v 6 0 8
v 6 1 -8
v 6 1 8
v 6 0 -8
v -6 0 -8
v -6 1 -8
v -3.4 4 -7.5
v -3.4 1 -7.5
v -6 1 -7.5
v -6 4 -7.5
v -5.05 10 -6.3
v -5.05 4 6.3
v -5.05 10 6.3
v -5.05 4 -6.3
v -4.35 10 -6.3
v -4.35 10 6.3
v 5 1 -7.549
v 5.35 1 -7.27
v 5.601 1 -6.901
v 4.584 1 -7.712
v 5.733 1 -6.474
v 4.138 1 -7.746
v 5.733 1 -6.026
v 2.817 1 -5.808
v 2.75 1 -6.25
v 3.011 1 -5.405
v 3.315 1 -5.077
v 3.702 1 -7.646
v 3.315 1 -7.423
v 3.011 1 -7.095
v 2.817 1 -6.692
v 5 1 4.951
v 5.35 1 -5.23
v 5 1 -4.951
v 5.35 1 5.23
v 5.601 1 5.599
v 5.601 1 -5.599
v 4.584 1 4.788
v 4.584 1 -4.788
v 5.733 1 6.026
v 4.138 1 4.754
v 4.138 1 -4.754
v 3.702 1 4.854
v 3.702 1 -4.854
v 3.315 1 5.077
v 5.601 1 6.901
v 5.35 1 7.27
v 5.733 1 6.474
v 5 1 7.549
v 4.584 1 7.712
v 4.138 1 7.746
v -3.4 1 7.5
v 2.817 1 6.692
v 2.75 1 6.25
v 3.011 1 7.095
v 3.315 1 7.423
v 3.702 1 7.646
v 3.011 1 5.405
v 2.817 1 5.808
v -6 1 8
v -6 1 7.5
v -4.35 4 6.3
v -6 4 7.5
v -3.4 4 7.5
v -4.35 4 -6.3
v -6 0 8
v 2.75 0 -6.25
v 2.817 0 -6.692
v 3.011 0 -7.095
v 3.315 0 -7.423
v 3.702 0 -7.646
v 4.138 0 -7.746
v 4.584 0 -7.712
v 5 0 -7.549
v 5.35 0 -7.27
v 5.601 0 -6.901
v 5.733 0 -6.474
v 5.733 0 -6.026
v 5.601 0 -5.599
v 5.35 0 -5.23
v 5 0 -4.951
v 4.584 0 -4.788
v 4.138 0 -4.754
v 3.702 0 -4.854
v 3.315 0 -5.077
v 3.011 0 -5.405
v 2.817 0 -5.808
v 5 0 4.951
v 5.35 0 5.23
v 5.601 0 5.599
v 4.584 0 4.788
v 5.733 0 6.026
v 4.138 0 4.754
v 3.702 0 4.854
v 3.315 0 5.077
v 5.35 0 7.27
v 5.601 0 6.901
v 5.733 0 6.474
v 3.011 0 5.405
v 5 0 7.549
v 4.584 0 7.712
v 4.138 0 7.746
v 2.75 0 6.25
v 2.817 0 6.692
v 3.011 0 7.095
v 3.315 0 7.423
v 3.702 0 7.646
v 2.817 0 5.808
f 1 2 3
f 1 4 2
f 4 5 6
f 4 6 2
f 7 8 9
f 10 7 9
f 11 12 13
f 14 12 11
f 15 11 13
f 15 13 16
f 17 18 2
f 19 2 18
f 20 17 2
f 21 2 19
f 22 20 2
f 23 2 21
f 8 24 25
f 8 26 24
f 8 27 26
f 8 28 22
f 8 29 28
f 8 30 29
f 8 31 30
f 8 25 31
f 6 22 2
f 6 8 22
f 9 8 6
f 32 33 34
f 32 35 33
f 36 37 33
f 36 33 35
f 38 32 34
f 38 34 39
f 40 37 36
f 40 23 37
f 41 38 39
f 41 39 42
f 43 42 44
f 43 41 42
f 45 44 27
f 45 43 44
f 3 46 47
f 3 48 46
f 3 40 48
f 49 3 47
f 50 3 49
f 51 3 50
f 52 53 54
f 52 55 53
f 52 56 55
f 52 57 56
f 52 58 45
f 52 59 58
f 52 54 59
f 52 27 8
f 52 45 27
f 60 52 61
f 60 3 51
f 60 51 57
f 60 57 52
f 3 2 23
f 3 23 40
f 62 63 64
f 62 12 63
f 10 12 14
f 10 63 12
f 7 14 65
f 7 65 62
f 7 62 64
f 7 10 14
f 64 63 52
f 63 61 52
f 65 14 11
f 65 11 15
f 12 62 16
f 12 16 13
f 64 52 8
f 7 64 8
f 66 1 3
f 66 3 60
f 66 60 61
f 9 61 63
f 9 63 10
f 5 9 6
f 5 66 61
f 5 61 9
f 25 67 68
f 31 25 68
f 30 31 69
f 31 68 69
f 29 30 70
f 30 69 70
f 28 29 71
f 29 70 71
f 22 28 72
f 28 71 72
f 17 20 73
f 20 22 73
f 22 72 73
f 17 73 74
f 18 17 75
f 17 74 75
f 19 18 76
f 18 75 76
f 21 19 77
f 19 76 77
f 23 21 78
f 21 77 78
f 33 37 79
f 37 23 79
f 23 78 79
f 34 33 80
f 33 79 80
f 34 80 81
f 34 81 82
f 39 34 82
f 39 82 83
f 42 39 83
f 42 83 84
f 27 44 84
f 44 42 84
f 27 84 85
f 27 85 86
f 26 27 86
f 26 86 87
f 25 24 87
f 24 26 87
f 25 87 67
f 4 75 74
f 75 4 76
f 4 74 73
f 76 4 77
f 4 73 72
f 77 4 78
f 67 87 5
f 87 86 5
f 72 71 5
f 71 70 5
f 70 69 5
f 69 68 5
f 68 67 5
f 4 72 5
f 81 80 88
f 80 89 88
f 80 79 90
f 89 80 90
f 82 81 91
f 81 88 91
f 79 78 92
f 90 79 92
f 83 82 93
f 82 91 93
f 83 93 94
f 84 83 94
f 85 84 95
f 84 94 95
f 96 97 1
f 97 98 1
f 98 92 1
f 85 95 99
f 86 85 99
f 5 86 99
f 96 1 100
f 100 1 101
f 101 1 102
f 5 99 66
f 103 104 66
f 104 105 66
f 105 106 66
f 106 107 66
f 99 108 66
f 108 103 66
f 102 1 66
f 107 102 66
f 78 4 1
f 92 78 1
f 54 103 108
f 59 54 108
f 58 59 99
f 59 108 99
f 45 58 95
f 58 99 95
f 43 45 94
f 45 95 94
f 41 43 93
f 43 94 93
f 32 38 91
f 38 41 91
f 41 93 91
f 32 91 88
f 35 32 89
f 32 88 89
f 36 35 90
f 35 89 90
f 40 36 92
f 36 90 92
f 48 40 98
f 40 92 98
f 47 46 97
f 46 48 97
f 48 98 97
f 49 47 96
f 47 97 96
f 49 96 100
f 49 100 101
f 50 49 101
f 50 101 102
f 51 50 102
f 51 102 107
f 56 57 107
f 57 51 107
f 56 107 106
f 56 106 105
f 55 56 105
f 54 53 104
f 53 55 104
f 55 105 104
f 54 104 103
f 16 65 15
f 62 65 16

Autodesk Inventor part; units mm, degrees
ref_plane "YZ Plane" through (0, 0, 0) normal (1, 0, 0) x (0, 1, 0)
ref_plane "XZ Plane" through (0, 0, 0) normal (0, 1, 0) x (-1, 0, 0)
ref_plane "XY Plane" through (0, 0, 0) normal (0, 0, 1) x (1, 0, 0)
sketch "Sketch1" plane through (0, 0, 0) normal (0, 1, 0) x (-1, 0, 0)
  line L0 (-6, 8) -> (6, 8)
  line L1 (6, 8) -> (6, -8)
  line L2 (6, -8) -> (-6, -8)
  line L3 (-6, -8) -> (-6, 8)
  line L4 (-6, 8) -> (6, -8) construction
  line L5 (6, 8) -> (-6, -8) construction
  line L6 (-6, 8) -> (-4.25, 8)
  line L7 (-6, 6.25) -> (-6, 8)
  circle A0 centre (-4.25, 6.25) radius 1.5
  line L8 (0, 0) -> (-1.7804, 0)
  circle A1 centre (-4.25, -6.25) radius 1.5
  dimension "d0" = 12
  dimension "d1" = 16
  dimension "d4" = 3
  dimension "d7" = 1.75
extrude "Extrusion1" add sketch "Sketch1" along normal blind 1
sketch "Sketch2" plane through (0, 1, 0) normal (0, 1, 0) x (1, 0, 0)
  line L0 (-6, 8) -> (-6, -8) projected
  line L1 (-3.4, 7.5) -> (-6, 7.5)
  line L2 (-6, 7.5) -> (-6, -7.5)
  line L3 (-6, -7.5) -> (-3.4, -7.5)
  line L4 (-3.4, -7.5) -> (-3.4, 7.5)
  line L5 (-3.4, 7.5) -> (-6, -7.5) construction
  line L6 (-6, 7.5) -> (-3.4, -7.5) construction
  point P0 (0, 0)
  dimension "d9" = 2.6
  dimension "d10" = 15
extrude "Extrusion2" add sketch "Sketch2" along normal blind 3
sketch "Sketch3" plane through (0, 4, 0) normal (0, 1, 0) x (1, 0, 0)
  line L0 (-6, -7.5) -> (-6, -8) projected
  line L1 (-6, 7.5) -> (-3.4, 7.5) projected
  line L2 (-6, 7.5) -> (-6, -7.5) projected
  line L3 (-3.4, -7.5) -> (-3.4, 7.5) projected
  line L4 (-4.35, -6.3) -> (-5.05, -6.3)
  line L5 (-5.05, -6.3) -> (-5.05, 6.3)
  line L6 (-5.05, 6.3) -> (-4.35, 6.3)
  line L7 (-4.35, 6.3) -> (-4.35, -6.3)
  line L8 (-4.35, -6.3) -> (-5.05, 6.3) construction
  line L9 (-5.05, -6.3) -> (-4.35, 6.3) construction
  point P0 (0, 0)
  point P1 (-4.7, 0)
  dimension "d13" = 12.6
  dimension "d14" = 0.7
extrude "Extrusion3" add sketch "Sketch3" along normal blind 6
properties part number "SensorPresionHumedadTemp"
